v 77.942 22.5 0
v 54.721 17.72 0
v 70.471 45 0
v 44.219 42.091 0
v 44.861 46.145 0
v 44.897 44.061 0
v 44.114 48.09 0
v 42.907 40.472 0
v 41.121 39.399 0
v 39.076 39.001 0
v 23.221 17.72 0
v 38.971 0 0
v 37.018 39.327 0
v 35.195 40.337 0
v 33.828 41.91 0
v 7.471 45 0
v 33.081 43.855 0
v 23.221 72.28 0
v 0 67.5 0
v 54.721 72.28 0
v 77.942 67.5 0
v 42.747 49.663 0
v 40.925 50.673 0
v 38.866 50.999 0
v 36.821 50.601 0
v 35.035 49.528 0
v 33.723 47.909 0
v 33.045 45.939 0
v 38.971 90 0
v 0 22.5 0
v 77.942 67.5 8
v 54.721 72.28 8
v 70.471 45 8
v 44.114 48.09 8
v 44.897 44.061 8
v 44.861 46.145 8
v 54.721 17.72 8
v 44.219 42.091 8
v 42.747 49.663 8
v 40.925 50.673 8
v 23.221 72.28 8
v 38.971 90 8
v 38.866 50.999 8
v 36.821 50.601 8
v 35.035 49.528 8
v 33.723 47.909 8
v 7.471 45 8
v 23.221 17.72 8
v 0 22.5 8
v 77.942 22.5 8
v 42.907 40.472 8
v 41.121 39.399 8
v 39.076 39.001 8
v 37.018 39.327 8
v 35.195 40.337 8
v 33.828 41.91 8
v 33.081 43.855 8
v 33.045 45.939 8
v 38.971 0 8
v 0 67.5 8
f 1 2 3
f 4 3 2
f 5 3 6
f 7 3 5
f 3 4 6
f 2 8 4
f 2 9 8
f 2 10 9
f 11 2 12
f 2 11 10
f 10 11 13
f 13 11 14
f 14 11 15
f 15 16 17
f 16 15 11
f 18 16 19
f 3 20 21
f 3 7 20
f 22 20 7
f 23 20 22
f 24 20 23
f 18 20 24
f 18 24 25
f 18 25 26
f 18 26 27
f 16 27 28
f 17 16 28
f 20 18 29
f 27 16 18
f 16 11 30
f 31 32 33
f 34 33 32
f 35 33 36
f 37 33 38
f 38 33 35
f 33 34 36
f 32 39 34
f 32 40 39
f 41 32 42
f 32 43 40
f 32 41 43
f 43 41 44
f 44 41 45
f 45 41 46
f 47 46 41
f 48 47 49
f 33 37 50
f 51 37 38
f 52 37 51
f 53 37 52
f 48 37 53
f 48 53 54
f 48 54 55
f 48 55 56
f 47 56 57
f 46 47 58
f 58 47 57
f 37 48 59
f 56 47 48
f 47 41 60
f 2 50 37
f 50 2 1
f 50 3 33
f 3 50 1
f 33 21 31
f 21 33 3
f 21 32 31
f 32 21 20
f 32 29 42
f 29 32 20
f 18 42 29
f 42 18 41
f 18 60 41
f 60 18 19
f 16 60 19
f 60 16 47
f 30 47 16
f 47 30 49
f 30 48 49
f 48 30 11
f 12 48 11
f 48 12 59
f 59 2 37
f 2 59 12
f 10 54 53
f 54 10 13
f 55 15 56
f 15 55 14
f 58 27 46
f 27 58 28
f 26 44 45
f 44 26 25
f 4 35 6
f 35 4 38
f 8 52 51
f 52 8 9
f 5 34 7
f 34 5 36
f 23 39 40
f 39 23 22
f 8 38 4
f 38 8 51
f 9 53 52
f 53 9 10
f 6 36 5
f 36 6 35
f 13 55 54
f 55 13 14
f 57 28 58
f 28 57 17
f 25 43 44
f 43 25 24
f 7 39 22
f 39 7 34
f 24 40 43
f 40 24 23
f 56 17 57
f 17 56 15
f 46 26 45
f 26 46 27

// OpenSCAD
$fn = 32;

// ----------------------------------------------------------------------
// Star wheel: 6-point blunt, R45
// ----------------------------------------------------------------------

// --- parameters (mm) ---
n_points = 6;             // number of points / teeth
r_out = 45;               // tip radius
r_in = 31.5;              // root radius
bore_r = 6;               // centre bore radius
plate_t = 8;              // plate thickness, Z (extrusion height)
bore_d = 12;              // centre bore diameter
fit_tol = 0.1;            // declared fit tolerance (prompt contract)
free_tol = 0.5;           // declared free tolerance (prompt contract)

profile = [[38.971, 90], [23.221, 72.28], [0, 67.5], [7.471, 45], [0, 22.5], [23.221, 17.72], [38.971, 0], [54.721, 17.72], [77.942, 22.5], [70.471, 45], [77.942, 67.5], [54.721, 72.28]];  // primary outline, 12 points, counter clockwise
void_1 = [[44.861, 46.145], [44.114, 48.09], [42.747, 49.663], [40.925, 50.673], [38.866, 50.999], [36.821, 50.601], [35.035, 49.528], [33.723, 47.909], [33.045, 45.939], [33.081, 43.855], [33.828, 41.91], [35.195, 40.337], [37.018, 39.327], [39.076, 39.001], [41.121, 39.399], [42.907, 40.472], [44.219, 42.091], [44.897, 44.061]];  // centre bore, 18 points

// --- the one profile operation ---
difference() {
  linear_extrude(height = plate_t) polygon(points = profile);
  translate([0, 0, -1])
    linear_extrude(height = plate_t + 2) polygon(points = void_1);
}
